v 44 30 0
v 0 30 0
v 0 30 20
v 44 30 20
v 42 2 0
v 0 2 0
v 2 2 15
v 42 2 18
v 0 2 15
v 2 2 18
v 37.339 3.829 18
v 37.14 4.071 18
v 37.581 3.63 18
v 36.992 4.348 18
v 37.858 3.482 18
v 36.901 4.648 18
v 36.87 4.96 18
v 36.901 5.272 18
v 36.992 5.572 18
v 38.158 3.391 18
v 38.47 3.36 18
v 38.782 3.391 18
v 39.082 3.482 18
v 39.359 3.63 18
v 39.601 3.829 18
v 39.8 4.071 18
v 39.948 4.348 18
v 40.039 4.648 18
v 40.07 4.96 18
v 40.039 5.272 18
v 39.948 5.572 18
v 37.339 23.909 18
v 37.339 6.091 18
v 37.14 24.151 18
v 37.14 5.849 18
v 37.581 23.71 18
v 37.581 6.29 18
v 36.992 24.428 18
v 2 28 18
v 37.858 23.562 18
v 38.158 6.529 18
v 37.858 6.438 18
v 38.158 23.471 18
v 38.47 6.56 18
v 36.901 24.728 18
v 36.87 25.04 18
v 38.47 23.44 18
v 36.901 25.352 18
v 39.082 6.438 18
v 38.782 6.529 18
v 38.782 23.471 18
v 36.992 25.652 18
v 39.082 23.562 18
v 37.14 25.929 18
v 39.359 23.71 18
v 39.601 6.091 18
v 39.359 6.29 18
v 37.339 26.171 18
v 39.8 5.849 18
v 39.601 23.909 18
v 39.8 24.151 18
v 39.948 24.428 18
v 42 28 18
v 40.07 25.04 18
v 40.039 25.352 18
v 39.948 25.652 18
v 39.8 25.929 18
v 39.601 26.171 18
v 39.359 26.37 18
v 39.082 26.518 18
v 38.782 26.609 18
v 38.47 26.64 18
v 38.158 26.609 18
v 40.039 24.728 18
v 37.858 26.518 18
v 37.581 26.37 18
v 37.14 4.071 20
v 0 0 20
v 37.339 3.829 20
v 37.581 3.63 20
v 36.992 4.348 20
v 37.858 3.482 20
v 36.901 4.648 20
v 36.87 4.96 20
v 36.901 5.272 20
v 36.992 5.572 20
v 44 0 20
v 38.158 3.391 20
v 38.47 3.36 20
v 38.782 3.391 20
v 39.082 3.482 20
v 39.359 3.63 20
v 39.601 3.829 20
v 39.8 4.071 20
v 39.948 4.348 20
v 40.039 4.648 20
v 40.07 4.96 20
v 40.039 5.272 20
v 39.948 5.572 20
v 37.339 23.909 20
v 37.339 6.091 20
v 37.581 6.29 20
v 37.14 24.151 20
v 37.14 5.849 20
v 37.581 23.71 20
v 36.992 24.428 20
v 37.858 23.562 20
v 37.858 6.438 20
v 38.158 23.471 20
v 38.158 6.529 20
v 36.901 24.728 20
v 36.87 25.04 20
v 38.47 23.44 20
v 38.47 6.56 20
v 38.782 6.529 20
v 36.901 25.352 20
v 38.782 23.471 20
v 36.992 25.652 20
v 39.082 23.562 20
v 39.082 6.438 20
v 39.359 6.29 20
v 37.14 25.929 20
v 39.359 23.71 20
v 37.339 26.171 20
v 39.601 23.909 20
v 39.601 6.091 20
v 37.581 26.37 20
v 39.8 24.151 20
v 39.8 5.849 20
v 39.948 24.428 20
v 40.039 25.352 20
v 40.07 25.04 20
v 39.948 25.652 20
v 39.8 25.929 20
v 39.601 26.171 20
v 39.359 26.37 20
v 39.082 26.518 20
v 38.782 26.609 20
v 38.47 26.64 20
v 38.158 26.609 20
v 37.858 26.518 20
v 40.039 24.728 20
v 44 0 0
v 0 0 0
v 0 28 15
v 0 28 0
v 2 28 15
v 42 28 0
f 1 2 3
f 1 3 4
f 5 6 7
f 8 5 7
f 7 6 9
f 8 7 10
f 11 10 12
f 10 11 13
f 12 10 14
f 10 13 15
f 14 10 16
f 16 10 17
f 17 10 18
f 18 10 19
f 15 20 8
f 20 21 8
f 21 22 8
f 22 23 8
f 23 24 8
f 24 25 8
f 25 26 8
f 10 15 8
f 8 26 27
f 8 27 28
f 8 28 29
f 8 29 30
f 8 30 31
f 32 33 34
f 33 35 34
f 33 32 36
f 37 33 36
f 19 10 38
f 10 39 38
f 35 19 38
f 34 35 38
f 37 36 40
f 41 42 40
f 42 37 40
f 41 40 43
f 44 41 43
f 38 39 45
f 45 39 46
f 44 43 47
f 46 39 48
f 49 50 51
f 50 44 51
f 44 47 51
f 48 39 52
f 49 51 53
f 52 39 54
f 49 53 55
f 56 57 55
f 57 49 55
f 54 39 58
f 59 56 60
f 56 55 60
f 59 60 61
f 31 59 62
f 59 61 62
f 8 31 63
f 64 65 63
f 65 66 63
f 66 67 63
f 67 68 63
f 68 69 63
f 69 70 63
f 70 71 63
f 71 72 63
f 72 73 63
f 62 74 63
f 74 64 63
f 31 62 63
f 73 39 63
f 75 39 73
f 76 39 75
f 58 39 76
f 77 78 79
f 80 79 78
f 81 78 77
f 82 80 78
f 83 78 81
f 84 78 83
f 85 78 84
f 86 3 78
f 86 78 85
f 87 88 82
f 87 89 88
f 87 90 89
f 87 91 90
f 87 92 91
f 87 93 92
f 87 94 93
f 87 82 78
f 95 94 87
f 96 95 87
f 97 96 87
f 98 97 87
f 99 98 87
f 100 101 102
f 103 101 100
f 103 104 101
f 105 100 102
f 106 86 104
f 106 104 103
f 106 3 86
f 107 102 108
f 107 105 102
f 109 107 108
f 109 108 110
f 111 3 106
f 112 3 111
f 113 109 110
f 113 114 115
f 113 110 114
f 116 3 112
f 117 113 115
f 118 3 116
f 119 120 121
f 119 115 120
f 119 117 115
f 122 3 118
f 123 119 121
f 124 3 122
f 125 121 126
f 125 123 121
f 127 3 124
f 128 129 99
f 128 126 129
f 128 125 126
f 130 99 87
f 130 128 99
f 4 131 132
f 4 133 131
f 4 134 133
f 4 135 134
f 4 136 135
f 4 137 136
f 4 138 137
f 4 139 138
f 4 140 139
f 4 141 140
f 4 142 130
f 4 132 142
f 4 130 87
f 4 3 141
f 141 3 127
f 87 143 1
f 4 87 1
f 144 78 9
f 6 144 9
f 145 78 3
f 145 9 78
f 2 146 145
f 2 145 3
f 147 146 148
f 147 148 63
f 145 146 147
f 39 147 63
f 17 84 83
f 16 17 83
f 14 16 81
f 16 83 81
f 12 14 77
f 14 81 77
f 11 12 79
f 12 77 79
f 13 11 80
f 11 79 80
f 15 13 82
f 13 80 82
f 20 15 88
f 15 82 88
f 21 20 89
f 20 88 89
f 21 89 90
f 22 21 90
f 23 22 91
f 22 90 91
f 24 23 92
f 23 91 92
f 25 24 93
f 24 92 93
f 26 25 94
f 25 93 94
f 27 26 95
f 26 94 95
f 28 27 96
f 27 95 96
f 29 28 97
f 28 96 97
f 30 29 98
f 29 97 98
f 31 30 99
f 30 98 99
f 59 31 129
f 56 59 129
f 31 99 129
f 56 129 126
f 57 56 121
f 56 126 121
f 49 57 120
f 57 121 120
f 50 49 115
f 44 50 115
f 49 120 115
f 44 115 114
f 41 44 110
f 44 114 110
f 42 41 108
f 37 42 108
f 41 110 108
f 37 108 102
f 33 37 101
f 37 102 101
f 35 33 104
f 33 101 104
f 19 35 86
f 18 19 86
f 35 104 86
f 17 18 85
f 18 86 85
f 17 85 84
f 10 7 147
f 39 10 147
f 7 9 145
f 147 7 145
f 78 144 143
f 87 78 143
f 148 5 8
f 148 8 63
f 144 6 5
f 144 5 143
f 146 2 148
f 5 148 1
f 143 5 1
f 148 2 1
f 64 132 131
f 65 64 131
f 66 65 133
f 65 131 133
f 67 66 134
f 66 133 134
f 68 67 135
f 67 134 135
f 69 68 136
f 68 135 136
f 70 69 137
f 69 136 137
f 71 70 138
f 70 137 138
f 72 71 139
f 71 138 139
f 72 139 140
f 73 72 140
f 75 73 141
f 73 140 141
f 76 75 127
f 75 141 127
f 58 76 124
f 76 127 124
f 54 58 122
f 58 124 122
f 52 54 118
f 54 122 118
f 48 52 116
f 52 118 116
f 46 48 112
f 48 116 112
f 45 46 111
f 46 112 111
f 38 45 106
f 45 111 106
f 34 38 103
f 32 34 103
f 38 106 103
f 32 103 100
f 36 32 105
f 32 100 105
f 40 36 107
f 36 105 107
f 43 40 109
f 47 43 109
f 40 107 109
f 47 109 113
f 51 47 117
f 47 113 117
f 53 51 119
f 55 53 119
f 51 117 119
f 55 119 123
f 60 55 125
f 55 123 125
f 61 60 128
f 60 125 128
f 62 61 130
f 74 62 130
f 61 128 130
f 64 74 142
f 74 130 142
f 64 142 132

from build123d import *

# Parameters (mm, degrees)
ESBO_O1_W                = 44
ESBO_O1_H                = 30
ESBO_O1_W_2              = 40
ESBO_O1_H_2              = 26
RESSALTO_EXTRUS_O1_DEPTH = 20
ESBO_O3_W                = 15
ESBO_O3_H                = 26
CORTE_EXTRUS_O1_DEPTH    = 20
ESBO_O4_W                = 44
ESBO_O4_H                = 30
RESSALTO_EXTRUS_O2_DEPTH = 2
ESBO_O5_R                = 1.6
CORTE_EXTRUS_O2_DEPTH    = 2


with BuildPart() as part:
    # Esboço1 → Ressalto-extrusão1 (new body)
    with BuildSketch(Plane.XY):
        with Locations((22, 15)):
            Rectangle(ESBO_O1_W, ESBO_O1_H)
        with Locations((22, 15)):
            Rectangle(ESBO_O1_W_2, ESBO_O1_H_2, mode=Mode.SUBTRACT)
    extrude(amount=RESSALTO_EXTRUS_O1_DEPTH)

    # Esboço3 → Corte-extrusão1 (cut)
    with BuildSketch(Plane.ZY):
        with Locations((7.5, 15)):
            Rectangle(ESBO_O3_W, ESBO_O3_H)
    extrude(amount=-CORTE_EXTRUS_O1_DEPTH, mode=Mode.SUBTRACT)

    # Esboço4 → Ressalto-extrusão2 (add)
    with BuildSketch(Plane.XY.offset(20)):
        with Locations((22, 15)):
            Rectangle(ESBO_O4_W, ESBO_O4_H)
    extrude(amount=-RESSALTO_EXTRUS_O2_DEPTH)

    # Esboço5 → Corte-extrusão2 (cut)
    with BuildSketch(Plane.XY.offset(20)):
        with Locations((38.47, 25.04)):
            Circle(ESBO_O5_R)
        with Locations(Location((38.47, 4.96, 0), (0, 0, 180))):
            Circle(ESBO_O5_R)
    extrude(amount=-CORTE_EXTRUS_O2_DEPTH, mode=Mode.SUBTRACT)


solid = part.part
